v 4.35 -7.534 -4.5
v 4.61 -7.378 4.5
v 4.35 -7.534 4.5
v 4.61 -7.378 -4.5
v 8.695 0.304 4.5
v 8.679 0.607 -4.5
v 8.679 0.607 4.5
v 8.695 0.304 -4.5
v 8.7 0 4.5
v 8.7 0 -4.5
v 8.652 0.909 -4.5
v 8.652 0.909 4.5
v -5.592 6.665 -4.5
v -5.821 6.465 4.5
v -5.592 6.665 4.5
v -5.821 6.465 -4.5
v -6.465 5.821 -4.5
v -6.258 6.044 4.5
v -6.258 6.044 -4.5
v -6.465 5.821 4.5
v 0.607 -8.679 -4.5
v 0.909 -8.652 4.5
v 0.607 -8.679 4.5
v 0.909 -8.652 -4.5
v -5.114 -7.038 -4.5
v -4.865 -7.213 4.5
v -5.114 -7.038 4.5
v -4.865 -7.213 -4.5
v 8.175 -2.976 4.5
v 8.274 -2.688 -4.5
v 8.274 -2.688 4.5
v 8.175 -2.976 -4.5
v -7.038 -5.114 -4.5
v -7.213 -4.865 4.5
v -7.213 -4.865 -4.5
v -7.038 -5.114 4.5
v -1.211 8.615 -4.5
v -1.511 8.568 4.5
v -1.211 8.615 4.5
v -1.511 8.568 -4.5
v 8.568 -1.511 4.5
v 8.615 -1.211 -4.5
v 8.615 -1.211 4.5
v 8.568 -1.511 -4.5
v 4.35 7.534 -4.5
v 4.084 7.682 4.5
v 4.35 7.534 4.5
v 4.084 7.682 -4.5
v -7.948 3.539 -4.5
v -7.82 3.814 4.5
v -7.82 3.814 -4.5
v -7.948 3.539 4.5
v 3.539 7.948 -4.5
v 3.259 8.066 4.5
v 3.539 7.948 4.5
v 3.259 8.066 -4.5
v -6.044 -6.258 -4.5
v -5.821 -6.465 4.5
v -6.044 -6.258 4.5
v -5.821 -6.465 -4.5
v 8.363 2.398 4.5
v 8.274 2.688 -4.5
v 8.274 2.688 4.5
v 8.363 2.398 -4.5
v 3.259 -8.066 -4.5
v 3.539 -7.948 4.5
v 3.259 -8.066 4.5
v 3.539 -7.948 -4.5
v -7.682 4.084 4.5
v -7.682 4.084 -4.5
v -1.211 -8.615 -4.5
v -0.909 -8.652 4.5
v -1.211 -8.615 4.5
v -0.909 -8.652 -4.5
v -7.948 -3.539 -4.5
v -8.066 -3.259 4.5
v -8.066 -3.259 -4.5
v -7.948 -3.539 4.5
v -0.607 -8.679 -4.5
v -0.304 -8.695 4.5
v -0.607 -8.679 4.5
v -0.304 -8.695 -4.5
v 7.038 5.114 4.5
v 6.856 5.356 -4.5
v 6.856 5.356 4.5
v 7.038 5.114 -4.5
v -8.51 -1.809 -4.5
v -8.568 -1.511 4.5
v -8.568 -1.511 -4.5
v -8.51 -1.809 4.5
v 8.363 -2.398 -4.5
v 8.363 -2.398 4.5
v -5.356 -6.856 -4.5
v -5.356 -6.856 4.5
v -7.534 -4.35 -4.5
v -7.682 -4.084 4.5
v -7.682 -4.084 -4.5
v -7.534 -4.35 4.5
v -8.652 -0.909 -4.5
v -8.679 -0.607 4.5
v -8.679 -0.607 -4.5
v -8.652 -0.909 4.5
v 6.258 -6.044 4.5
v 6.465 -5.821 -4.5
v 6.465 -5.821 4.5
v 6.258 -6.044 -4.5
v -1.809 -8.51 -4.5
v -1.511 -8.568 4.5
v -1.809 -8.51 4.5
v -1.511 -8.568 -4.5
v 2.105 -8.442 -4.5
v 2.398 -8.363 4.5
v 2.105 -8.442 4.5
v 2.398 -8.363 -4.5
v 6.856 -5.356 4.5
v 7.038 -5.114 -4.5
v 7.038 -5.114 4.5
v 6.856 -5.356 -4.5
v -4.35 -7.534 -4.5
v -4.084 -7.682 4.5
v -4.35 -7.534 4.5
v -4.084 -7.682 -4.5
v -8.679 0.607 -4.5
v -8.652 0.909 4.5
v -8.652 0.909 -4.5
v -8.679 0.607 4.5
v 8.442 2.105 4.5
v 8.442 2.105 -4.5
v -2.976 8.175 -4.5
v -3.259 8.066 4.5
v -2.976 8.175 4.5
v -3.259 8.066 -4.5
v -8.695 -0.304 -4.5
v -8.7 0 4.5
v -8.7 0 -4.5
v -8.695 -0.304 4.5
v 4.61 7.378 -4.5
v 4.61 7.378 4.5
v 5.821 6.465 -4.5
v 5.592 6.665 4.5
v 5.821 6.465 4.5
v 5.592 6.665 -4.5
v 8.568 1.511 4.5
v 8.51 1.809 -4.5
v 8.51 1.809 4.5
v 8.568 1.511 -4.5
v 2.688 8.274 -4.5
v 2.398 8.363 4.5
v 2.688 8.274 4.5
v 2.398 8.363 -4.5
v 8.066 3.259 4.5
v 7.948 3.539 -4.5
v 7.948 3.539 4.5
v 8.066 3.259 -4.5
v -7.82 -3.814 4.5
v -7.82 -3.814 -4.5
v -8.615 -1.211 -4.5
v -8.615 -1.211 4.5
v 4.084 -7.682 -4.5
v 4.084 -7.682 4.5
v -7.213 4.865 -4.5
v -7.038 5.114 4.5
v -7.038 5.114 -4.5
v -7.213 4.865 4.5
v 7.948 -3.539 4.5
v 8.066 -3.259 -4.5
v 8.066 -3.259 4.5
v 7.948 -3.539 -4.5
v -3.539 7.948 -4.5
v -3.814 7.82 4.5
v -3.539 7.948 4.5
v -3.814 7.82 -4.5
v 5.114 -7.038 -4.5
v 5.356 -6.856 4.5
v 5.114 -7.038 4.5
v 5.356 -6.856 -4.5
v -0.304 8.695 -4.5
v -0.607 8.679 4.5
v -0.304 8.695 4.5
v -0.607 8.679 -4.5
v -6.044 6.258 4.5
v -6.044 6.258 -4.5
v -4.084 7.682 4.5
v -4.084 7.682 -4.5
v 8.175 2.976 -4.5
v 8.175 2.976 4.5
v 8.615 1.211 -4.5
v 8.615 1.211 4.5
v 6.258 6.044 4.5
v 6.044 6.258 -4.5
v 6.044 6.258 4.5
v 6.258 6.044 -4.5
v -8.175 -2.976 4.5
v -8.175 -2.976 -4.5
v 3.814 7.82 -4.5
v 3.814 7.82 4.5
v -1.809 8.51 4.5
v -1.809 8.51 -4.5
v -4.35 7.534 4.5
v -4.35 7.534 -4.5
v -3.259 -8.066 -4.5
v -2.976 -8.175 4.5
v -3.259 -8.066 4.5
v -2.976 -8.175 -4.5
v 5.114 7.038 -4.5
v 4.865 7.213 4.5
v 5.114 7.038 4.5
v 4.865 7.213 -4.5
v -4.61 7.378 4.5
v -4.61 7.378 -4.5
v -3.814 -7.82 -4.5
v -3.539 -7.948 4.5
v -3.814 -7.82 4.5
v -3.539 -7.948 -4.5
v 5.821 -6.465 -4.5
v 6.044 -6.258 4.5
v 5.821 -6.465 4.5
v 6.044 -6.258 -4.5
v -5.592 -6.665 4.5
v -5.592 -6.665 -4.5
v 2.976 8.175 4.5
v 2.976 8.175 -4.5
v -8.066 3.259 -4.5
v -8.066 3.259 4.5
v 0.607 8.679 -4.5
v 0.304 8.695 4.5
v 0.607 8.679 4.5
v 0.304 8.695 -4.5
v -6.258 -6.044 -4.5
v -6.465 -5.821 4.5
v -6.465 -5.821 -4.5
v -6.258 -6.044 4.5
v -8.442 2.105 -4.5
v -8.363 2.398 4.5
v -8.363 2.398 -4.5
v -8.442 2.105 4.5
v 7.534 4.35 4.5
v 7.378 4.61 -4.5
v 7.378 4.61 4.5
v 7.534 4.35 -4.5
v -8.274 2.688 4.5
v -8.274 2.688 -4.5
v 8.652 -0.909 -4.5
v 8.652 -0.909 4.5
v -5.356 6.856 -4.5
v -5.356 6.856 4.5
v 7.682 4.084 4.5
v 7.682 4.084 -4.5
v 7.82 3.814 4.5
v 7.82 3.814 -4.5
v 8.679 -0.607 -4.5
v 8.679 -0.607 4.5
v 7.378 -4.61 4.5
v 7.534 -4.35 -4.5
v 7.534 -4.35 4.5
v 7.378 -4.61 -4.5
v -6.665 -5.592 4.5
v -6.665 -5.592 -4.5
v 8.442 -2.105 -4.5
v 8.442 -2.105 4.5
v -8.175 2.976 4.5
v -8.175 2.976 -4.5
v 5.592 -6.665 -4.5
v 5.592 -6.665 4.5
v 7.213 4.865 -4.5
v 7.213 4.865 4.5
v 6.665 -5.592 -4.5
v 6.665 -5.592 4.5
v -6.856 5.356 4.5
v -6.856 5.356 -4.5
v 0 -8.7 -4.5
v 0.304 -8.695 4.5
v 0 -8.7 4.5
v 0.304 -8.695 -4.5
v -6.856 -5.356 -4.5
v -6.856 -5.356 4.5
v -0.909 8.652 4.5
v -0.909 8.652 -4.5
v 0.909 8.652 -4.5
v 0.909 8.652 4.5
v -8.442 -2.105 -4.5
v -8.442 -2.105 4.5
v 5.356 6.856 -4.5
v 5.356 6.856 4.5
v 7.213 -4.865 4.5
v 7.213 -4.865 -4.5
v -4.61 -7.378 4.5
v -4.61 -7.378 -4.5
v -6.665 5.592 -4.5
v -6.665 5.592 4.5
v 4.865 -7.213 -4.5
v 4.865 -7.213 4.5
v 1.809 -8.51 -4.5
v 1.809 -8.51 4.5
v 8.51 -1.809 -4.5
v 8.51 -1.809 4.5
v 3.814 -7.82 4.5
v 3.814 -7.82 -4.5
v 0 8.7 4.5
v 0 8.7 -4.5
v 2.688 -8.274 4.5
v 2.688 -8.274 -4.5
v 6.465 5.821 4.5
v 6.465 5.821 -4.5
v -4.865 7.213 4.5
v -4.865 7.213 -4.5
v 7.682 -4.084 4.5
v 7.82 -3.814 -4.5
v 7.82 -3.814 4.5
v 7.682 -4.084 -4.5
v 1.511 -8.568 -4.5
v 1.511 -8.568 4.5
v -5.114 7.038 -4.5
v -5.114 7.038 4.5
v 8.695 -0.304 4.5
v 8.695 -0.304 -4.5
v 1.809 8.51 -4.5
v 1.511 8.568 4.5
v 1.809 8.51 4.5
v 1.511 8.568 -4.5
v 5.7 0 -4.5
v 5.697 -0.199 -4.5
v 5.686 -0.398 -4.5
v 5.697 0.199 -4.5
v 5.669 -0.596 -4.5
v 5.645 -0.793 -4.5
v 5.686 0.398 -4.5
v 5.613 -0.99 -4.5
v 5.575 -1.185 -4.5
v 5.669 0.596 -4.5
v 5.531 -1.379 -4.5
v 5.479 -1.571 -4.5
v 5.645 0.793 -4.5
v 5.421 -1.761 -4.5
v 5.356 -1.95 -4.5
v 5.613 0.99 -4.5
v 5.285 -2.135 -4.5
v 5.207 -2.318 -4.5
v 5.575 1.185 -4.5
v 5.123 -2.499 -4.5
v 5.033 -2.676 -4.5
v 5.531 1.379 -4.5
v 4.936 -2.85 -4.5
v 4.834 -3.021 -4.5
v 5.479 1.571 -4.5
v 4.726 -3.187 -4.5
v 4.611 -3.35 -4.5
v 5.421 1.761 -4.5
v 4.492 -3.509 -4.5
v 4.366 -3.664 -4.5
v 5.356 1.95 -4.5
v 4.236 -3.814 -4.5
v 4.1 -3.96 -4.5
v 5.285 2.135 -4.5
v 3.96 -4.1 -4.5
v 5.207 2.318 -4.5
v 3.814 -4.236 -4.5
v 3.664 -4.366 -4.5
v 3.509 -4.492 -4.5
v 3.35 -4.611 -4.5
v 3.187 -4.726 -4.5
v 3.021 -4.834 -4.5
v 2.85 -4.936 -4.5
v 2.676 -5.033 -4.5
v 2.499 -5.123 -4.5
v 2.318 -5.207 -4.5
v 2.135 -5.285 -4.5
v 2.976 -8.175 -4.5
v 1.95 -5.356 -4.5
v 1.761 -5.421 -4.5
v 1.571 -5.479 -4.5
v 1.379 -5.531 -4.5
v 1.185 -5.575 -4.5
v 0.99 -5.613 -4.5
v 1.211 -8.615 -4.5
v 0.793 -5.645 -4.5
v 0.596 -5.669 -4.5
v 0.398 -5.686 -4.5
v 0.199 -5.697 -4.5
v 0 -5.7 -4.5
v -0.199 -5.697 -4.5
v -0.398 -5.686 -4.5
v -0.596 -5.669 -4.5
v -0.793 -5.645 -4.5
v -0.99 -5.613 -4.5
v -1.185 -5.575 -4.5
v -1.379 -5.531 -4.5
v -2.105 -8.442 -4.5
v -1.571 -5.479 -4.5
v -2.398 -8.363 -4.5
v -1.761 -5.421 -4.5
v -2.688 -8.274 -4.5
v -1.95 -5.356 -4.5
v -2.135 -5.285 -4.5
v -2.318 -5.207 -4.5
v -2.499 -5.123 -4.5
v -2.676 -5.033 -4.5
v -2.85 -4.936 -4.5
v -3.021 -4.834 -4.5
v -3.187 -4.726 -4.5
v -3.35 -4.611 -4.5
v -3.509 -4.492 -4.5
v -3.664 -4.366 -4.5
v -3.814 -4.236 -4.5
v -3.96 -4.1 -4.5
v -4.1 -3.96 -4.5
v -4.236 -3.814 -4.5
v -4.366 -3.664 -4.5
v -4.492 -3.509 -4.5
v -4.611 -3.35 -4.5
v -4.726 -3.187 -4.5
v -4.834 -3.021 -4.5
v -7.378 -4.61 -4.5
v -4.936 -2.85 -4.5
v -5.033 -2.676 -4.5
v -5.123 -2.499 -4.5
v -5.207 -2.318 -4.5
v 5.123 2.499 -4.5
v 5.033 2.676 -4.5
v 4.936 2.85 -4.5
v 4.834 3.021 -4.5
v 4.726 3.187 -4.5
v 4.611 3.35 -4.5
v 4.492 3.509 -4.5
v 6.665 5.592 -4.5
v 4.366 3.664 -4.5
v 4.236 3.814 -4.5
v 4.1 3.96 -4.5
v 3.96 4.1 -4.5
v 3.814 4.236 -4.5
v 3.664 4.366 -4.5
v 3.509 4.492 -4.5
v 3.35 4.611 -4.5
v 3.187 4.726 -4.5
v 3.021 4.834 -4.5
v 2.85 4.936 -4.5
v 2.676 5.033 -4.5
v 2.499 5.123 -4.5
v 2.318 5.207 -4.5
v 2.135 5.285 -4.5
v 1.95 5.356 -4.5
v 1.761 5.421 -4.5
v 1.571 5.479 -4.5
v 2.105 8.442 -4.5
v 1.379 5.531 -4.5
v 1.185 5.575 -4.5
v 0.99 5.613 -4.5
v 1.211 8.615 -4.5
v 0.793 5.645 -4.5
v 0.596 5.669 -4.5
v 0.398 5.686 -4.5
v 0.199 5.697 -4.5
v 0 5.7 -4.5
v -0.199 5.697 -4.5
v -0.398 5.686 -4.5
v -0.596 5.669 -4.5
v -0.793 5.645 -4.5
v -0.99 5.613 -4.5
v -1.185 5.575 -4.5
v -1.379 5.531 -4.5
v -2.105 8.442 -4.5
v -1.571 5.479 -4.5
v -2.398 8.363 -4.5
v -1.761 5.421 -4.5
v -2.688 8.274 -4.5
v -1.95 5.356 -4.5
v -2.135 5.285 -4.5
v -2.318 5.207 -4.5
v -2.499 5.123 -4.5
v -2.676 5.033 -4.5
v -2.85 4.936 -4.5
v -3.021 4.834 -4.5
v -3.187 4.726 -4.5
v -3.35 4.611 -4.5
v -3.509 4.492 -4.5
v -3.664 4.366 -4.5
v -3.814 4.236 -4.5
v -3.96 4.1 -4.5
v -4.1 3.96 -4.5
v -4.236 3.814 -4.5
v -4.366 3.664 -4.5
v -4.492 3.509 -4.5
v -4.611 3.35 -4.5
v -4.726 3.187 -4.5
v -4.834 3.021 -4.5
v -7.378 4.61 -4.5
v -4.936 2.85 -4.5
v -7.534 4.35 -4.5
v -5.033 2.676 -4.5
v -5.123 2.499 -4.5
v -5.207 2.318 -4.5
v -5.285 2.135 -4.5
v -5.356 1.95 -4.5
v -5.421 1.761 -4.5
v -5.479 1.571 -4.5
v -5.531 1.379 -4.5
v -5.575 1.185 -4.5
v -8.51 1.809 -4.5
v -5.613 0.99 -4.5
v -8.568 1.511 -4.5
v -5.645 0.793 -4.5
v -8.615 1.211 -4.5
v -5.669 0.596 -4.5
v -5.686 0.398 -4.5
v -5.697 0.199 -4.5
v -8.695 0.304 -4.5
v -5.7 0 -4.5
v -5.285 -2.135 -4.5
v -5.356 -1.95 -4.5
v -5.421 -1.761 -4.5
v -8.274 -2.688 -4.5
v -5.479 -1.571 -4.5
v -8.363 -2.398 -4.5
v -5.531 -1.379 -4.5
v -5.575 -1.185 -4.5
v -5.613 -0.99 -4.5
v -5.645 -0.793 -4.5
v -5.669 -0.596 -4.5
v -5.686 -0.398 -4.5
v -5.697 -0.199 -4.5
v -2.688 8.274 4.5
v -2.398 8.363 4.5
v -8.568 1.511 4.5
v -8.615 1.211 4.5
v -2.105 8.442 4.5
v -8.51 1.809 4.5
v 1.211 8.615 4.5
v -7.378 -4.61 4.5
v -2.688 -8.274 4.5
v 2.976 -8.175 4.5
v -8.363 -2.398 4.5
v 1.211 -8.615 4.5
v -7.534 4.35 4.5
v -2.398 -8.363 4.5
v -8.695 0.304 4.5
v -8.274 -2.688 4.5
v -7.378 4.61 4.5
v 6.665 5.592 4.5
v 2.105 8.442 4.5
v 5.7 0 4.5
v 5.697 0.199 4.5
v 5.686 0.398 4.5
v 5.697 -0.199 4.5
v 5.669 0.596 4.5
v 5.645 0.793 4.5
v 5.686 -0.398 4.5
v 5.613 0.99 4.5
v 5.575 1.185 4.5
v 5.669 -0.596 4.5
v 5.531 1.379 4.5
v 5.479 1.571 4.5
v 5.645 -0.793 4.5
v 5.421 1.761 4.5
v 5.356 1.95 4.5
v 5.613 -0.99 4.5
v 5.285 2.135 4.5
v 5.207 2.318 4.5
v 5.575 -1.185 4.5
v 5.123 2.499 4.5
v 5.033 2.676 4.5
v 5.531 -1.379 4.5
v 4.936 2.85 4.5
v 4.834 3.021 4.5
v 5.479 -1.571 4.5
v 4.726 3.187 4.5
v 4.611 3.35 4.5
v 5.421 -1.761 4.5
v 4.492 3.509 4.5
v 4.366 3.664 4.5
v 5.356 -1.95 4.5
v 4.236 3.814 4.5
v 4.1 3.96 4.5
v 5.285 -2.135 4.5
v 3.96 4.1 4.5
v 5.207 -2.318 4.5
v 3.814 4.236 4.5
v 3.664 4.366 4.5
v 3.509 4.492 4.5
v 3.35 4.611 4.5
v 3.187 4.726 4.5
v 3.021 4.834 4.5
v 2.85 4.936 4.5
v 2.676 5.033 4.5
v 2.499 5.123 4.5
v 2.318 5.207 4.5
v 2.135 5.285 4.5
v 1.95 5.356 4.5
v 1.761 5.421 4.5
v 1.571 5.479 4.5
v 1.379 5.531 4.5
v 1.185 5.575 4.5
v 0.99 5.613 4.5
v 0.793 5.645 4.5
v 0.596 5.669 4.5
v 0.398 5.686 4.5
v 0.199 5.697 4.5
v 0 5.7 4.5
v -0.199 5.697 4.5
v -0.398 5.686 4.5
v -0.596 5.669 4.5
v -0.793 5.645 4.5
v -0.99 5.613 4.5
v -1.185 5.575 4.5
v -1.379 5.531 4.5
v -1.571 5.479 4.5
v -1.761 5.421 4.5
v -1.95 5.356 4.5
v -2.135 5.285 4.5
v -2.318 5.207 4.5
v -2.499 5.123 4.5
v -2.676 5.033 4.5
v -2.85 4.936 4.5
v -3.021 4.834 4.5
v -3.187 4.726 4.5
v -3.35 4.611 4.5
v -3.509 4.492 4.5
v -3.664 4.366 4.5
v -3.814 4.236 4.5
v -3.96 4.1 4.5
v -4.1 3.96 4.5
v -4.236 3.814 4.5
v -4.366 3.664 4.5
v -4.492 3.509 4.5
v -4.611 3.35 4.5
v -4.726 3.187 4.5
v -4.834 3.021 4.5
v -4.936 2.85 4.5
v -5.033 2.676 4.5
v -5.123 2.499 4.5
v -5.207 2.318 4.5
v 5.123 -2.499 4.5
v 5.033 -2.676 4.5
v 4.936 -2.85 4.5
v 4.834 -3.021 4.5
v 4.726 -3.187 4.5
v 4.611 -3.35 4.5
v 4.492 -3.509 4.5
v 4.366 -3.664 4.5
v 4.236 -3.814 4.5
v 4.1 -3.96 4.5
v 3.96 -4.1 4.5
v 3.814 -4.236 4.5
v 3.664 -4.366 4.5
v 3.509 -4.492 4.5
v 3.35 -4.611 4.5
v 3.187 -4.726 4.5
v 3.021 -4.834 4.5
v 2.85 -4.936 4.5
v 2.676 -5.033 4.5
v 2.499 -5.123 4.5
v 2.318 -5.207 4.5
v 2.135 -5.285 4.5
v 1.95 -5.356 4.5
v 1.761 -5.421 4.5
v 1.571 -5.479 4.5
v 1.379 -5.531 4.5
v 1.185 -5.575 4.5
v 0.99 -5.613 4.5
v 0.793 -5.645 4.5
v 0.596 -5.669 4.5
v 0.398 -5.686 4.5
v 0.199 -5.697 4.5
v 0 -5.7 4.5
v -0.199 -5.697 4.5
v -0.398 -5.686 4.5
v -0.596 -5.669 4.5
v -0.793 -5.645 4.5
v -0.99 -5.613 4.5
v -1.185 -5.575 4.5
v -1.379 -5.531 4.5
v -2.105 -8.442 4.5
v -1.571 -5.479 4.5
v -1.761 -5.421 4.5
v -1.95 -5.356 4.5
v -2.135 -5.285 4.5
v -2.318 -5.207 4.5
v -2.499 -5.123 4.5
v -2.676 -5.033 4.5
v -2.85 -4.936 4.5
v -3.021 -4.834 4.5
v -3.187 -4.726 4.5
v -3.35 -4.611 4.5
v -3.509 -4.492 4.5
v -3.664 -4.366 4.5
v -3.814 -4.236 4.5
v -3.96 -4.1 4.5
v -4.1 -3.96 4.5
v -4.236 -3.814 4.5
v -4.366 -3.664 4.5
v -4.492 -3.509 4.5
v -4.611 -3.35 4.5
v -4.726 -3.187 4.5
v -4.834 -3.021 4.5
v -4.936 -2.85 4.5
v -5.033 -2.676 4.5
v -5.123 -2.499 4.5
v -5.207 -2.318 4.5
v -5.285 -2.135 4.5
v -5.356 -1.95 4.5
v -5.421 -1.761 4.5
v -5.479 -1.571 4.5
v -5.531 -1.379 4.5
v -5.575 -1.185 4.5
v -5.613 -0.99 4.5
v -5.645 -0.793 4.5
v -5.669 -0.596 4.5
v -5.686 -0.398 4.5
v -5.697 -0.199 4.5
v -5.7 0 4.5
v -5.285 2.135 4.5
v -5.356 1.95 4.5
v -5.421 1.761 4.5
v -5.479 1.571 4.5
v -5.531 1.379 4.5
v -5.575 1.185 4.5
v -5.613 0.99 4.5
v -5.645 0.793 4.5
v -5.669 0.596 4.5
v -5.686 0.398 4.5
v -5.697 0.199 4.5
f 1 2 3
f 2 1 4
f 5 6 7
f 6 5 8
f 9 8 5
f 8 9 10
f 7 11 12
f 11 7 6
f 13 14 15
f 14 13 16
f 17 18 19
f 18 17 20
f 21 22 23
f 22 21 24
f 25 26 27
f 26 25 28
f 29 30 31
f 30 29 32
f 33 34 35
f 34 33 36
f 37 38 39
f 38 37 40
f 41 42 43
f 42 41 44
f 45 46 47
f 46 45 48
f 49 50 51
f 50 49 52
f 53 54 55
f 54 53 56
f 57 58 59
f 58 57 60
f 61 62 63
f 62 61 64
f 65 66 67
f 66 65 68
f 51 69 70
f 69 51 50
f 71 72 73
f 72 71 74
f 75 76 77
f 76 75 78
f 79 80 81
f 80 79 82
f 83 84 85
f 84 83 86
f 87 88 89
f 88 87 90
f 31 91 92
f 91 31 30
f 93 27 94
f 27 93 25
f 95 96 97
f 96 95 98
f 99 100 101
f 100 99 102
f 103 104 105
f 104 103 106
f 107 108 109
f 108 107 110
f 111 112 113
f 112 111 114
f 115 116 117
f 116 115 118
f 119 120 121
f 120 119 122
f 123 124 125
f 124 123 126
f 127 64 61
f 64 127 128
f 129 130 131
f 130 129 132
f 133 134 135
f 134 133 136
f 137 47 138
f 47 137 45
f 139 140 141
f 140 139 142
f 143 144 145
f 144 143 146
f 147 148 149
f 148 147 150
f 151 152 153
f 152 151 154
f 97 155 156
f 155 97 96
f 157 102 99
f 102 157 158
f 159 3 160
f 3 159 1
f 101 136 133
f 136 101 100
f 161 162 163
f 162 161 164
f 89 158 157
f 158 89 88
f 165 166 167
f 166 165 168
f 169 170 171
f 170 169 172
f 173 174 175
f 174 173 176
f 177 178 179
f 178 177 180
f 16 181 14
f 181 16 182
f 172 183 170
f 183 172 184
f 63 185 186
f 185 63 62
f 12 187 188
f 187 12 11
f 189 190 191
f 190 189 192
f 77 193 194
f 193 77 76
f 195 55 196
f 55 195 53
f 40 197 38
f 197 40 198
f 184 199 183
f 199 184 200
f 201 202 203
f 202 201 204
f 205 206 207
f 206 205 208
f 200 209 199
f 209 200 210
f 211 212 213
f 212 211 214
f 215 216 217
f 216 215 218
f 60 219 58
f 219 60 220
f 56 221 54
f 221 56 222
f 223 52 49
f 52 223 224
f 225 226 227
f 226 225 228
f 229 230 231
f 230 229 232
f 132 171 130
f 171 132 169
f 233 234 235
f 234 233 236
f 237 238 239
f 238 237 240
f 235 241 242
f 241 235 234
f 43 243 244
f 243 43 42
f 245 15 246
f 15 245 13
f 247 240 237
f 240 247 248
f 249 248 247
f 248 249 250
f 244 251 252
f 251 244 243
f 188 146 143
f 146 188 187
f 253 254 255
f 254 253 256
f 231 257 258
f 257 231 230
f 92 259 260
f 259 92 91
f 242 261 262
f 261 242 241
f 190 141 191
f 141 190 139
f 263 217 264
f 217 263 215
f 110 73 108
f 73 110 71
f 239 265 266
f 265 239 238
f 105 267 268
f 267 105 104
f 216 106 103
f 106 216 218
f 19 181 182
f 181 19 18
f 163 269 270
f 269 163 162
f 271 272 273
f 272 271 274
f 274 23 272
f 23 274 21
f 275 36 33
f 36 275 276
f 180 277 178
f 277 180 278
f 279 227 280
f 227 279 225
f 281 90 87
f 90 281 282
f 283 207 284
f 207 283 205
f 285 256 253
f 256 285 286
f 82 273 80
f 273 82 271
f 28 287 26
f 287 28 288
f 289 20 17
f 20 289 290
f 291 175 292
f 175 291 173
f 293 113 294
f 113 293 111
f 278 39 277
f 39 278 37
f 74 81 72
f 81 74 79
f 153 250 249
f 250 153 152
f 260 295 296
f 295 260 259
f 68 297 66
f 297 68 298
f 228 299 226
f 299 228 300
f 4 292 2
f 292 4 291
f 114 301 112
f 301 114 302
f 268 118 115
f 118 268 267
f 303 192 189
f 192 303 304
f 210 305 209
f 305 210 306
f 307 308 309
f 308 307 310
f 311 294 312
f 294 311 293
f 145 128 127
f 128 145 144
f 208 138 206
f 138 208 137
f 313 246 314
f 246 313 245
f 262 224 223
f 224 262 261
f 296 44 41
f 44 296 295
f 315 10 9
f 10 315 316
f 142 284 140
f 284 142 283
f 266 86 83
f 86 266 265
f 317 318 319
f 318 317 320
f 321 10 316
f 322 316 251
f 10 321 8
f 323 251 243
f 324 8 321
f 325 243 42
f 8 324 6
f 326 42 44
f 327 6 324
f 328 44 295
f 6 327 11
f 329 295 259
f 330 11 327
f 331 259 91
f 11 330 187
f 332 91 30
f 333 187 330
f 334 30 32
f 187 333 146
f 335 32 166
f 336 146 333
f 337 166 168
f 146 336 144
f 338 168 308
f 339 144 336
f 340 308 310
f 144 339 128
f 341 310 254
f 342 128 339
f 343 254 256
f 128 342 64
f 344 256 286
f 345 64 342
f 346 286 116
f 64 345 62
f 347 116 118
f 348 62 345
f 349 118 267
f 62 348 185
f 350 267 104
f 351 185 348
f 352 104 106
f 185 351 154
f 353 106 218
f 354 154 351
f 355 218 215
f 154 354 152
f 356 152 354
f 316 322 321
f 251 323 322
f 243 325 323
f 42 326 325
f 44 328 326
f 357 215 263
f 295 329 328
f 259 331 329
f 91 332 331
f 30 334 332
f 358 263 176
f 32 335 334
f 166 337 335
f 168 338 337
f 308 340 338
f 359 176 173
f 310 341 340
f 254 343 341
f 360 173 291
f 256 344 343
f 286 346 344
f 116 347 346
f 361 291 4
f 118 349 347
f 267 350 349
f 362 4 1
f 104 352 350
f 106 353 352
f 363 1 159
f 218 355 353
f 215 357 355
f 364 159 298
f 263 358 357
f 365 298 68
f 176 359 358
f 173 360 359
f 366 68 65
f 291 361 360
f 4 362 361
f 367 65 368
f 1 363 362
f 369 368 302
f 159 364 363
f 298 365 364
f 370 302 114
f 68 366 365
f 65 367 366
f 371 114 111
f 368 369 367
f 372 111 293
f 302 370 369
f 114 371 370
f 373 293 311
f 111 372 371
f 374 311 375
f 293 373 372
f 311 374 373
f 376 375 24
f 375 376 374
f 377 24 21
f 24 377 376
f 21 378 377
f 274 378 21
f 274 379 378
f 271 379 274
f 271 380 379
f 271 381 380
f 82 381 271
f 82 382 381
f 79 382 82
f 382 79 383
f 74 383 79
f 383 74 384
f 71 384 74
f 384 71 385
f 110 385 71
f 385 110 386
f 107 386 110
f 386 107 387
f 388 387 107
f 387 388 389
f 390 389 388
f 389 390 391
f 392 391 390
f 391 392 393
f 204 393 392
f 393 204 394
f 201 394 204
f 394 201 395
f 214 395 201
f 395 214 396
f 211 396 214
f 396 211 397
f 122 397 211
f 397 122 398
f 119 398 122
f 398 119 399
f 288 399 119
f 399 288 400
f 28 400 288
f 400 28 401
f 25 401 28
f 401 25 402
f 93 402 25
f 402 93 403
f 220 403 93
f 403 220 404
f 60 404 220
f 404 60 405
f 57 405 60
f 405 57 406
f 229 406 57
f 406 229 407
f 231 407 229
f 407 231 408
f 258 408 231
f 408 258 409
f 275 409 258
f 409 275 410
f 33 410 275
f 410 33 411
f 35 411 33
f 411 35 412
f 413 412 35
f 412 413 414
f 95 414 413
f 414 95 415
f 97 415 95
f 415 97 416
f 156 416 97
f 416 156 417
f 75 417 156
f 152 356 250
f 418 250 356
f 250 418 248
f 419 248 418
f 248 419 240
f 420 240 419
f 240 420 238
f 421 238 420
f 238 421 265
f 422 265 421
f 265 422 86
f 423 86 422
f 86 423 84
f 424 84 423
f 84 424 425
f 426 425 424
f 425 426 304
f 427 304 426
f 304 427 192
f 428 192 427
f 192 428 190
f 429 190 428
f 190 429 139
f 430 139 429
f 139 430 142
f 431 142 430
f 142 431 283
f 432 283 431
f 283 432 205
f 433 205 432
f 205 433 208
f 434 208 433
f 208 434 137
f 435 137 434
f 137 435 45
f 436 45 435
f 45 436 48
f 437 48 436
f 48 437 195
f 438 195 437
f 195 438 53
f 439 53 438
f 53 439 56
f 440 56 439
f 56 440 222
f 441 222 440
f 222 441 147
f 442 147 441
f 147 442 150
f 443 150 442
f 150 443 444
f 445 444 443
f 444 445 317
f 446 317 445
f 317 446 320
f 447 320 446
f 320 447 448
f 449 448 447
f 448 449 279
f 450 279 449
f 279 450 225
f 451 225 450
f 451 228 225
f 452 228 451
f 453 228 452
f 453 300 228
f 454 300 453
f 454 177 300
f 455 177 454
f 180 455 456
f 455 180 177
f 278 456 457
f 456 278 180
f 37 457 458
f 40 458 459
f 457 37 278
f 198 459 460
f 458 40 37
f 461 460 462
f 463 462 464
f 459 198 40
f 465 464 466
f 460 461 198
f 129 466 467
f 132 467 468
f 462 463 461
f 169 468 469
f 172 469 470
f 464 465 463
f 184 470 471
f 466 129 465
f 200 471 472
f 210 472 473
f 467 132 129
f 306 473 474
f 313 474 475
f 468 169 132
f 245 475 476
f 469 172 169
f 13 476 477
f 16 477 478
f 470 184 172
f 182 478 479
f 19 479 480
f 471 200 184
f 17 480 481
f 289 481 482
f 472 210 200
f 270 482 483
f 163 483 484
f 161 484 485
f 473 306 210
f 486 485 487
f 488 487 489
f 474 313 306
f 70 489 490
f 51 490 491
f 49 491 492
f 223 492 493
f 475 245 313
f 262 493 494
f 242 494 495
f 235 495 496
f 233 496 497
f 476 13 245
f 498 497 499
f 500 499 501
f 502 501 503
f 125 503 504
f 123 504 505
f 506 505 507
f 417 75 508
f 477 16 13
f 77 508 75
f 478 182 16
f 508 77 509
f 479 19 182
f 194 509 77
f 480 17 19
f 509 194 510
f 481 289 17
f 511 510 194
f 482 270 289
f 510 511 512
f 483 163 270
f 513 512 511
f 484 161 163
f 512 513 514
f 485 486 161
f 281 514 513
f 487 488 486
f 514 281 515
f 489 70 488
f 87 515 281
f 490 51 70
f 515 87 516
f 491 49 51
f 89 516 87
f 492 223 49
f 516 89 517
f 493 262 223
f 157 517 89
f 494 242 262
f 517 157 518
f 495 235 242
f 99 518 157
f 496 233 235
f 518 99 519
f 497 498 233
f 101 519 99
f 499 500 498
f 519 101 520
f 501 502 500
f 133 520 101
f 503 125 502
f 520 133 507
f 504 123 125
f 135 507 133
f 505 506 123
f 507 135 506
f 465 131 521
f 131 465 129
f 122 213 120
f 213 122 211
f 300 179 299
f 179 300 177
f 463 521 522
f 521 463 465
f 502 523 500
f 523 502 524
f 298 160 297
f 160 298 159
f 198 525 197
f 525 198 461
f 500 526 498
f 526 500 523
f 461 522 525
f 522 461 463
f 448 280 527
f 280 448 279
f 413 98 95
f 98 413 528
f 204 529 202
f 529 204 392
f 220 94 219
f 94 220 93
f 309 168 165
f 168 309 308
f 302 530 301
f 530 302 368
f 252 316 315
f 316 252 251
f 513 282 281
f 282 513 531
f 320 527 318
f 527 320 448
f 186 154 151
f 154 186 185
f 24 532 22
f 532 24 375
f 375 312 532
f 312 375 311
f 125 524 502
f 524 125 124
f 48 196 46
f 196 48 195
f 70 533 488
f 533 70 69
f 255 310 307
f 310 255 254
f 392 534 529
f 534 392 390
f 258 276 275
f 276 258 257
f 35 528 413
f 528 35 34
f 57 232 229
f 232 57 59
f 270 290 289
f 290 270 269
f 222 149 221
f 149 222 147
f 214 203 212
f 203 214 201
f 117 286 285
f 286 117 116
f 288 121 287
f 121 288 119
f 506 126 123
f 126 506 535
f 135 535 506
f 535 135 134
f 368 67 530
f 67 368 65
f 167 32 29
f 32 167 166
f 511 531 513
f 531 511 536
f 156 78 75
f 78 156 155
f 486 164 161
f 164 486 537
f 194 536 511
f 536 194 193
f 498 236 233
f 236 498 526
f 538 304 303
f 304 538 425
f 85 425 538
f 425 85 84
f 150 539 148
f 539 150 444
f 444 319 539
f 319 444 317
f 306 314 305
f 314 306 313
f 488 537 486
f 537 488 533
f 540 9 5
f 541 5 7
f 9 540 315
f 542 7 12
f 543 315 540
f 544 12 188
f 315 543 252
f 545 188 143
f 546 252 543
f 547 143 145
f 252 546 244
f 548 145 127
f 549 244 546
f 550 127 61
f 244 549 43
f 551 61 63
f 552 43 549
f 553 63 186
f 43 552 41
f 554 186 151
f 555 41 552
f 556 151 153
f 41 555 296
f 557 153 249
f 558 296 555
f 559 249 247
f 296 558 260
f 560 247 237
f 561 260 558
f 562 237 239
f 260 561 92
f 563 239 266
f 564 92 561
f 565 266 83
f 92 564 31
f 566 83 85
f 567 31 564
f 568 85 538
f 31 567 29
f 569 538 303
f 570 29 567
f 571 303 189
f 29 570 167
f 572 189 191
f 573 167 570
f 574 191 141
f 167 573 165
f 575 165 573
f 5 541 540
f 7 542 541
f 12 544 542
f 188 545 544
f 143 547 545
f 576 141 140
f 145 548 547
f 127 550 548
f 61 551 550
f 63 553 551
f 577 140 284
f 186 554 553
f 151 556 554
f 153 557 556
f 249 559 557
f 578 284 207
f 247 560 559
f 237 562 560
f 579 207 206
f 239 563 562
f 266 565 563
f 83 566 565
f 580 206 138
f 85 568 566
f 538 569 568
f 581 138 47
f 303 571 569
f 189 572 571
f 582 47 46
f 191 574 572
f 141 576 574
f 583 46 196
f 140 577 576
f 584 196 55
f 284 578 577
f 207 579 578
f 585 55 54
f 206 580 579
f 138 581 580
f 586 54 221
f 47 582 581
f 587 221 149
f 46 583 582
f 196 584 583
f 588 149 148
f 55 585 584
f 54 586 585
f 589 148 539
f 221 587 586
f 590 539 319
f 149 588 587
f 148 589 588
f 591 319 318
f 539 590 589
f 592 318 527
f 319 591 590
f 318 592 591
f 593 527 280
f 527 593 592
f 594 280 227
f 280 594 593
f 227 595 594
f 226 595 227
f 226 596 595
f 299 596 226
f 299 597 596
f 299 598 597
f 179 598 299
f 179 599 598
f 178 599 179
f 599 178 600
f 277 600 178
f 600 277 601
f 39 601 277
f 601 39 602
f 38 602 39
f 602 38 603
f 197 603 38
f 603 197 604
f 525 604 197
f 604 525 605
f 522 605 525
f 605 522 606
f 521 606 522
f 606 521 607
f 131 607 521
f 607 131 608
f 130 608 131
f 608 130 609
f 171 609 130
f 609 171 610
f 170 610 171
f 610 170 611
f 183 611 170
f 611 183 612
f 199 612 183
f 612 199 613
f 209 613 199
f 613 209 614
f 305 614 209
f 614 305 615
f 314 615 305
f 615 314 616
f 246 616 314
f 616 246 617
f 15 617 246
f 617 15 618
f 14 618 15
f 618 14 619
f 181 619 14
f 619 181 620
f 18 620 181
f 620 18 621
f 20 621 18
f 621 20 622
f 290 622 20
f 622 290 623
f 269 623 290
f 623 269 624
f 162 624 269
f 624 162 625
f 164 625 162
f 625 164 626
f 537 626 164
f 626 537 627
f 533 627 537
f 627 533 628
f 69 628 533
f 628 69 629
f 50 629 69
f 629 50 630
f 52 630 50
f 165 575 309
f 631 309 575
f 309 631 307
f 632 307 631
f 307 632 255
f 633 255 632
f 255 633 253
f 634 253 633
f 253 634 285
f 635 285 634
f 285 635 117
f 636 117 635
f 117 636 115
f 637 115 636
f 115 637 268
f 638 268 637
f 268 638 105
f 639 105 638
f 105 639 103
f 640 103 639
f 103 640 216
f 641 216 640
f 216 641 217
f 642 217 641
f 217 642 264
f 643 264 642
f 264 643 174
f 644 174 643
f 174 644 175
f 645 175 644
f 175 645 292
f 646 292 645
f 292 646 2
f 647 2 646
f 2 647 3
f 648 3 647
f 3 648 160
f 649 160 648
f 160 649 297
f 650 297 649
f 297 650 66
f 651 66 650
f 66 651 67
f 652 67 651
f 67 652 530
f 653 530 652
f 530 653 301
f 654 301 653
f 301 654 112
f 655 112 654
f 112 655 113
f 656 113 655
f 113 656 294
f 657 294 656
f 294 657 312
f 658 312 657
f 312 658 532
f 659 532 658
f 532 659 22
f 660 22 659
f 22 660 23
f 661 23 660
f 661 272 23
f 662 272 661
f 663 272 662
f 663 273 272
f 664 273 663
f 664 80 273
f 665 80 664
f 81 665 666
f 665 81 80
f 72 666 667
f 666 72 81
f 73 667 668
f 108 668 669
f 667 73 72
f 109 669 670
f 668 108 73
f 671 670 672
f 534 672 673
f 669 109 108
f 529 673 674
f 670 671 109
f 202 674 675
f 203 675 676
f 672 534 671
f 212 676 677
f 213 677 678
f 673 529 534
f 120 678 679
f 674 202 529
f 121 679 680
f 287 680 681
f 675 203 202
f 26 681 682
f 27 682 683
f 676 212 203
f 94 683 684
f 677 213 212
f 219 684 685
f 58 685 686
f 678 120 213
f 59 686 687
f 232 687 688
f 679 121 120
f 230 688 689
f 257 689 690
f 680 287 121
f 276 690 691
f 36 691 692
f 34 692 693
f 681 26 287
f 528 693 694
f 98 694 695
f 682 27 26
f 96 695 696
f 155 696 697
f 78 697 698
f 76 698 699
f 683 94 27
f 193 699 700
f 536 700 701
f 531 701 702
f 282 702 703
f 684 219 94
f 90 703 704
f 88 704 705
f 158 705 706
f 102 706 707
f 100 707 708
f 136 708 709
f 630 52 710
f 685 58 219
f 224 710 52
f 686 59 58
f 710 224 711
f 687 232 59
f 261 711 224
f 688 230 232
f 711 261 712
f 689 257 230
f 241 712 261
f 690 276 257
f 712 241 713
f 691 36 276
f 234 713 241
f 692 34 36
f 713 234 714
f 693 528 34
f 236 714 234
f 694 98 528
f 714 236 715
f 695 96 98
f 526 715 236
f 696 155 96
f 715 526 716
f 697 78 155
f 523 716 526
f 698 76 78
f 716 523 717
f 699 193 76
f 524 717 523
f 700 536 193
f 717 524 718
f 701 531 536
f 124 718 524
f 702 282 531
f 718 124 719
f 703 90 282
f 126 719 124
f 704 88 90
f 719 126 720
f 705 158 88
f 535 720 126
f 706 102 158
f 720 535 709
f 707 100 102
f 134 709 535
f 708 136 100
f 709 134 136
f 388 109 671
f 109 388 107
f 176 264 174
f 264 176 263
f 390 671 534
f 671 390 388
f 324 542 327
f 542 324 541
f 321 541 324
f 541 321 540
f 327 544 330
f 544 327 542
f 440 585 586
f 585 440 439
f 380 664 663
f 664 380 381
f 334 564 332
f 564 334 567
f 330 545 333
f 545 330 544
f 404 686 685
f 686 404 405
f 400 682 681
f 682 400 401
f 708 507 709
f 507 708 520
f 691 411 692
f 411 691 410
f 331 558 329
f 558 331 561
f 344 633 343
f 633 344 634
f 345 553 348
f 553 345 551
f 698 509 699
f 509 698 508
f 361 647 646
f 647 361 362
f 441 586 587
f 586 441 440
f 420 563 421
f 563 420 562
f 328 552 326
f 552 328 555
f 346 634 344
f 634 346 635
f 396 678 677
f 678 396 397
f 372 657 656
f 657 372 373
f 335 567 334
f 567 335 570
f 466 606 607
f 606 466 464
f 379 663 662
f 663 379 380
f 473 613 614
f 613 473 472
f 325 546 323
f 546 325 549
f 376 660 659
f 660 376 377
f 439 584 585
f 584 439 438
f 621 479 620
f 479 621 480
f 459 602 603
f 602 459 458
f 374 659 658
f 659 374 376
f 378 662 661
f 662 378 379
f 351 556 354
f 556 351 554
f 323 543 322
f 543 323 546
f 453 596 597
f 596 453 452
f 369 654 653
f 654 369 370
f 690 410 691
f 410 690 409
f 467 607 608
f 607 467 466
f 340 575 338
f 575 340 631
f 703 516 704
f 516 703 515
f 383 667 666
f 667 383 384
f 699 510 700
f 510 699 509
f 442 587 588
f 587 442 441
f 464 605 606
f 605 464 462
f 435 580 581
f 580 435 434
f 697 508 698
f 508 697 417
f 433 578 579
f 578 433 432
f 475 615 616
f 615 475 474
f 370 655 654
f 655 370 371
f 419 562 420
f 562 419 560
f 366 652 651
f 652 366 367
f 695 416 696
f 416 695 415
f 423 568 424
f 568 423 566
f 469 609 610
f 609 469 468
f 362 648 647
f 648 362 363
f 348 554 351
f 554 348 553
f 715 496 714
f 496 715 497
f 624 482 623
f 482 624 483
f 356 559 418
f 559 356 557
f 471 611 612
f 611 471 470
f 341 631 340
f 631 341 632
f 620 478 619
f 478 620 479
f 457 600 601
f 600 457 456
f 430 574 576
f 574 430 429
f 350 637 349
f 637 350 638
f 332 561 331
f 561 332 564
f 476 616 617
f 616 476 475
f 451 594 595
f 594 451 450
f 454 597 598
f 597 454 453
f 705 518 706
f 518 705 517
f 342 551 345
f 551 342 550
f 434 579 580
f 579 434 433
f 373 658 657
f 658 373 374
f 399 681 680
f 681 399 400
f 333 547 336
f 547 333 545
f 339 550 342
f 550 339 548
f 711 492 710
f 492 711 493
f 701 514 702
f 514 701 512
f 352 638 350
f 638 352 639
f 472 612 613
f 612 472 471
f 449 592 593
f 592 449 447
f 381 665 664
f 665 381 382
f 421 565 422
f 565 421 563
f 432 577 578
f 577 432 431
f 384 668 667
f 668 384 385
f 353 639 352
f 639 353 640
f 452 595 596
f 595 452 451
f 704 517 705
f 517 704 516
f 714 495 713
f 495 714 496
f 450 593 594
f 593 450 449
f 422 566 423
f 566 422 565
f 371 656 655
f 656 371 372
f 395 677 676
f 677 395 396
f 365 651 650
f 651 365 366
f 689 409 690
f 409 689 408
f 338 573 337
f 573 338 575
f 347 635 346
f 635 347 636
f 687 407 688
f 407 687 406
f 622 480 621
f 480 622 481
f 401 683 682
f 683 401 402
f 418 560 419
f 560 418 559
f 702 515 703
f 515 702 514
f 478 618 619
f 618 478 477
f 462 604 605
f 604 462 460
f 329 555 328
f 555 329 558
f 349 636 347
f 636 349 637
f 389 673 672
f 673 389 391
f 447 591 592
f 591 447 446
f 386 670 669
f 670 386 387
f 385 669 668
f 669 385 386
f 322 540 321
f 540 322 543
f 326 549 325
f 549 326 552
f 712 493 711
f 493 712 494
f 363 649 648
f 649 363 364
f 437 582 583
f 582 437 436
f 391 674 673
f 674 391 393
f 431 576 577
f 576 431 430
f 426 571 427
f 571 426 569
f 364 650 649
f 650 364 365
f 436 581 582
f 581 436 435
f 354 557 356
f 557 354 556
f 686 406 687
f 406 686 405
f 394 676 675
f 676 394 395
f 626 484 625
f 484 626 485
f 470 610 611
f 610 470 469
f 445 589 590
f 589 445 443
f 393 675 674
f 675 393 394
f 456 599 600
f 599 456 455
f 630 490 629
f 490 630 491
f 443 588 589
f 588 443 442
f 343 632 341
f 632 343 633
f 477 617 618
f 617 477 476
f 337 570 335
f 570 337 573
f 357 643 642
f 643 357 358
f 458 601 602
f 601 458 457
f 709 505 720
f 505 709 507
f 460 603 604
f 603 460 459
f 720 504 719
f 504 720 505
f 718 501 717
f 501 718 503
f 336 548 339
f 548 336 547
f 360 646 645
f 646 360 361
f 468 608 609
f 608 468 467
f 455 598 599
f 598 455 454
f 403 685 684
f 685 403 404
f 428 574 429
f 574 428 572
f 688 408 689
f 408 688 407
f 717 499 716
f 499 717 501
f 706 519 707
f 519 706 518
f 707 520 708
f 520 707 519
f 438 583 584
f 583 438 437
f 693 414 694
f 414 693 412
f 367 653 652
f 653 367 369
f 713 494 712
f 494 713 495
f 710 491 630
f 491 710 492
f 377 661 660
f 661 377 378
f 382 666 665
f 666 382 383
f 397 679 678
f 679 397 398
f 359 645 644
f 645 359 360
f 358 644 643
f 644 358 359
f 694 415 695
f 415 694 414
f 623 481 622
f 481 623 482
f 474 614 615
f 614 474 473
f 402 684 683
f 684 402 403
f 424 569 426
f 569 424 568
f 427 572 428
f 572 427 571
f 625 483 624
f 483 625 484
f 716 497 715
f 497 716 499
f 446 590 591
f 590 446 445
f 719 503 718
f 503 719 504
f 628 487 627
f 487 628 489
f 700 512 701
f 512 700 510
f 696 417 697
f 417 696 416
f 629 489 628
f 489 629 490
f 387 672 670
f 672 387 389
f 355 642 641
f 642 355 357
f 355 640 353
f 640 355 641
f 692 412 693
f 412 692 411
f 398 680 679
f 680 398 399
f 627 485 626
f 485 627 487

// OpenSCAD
// Radial parameters: [outer_d, inner_d, height, lip]
A = [17.4, 11.4, 9, 0.5];

outer_d = A[0];
inner_d = A[1];
h       = A[2];
lip     = A[3];

outer_r = outer_d/2;
inner_r = inner_d/2;

$fn = 180;

module radial_ring() {
    // Single connected solid: ring + small outer lip (integral, not floating)
    union() {
        // Main ring body
        difference() {
            cylinder(h=h, r=outer_r, center=true);
            cylinder(h=h + 0.02, r=inner_r, center=true);
        }

        // Outer lip (a thin radial step) centered so it overlaps the main ring
        // Ensures connectivity and matches lip thickness parameter.
        difference() {
            cylinder(h=lip, r=outer_r, center=true);
            cylinder(h=lip + 0.02, r=outer_r - lip, center=true);
        }
    }
}

radial_ring();
